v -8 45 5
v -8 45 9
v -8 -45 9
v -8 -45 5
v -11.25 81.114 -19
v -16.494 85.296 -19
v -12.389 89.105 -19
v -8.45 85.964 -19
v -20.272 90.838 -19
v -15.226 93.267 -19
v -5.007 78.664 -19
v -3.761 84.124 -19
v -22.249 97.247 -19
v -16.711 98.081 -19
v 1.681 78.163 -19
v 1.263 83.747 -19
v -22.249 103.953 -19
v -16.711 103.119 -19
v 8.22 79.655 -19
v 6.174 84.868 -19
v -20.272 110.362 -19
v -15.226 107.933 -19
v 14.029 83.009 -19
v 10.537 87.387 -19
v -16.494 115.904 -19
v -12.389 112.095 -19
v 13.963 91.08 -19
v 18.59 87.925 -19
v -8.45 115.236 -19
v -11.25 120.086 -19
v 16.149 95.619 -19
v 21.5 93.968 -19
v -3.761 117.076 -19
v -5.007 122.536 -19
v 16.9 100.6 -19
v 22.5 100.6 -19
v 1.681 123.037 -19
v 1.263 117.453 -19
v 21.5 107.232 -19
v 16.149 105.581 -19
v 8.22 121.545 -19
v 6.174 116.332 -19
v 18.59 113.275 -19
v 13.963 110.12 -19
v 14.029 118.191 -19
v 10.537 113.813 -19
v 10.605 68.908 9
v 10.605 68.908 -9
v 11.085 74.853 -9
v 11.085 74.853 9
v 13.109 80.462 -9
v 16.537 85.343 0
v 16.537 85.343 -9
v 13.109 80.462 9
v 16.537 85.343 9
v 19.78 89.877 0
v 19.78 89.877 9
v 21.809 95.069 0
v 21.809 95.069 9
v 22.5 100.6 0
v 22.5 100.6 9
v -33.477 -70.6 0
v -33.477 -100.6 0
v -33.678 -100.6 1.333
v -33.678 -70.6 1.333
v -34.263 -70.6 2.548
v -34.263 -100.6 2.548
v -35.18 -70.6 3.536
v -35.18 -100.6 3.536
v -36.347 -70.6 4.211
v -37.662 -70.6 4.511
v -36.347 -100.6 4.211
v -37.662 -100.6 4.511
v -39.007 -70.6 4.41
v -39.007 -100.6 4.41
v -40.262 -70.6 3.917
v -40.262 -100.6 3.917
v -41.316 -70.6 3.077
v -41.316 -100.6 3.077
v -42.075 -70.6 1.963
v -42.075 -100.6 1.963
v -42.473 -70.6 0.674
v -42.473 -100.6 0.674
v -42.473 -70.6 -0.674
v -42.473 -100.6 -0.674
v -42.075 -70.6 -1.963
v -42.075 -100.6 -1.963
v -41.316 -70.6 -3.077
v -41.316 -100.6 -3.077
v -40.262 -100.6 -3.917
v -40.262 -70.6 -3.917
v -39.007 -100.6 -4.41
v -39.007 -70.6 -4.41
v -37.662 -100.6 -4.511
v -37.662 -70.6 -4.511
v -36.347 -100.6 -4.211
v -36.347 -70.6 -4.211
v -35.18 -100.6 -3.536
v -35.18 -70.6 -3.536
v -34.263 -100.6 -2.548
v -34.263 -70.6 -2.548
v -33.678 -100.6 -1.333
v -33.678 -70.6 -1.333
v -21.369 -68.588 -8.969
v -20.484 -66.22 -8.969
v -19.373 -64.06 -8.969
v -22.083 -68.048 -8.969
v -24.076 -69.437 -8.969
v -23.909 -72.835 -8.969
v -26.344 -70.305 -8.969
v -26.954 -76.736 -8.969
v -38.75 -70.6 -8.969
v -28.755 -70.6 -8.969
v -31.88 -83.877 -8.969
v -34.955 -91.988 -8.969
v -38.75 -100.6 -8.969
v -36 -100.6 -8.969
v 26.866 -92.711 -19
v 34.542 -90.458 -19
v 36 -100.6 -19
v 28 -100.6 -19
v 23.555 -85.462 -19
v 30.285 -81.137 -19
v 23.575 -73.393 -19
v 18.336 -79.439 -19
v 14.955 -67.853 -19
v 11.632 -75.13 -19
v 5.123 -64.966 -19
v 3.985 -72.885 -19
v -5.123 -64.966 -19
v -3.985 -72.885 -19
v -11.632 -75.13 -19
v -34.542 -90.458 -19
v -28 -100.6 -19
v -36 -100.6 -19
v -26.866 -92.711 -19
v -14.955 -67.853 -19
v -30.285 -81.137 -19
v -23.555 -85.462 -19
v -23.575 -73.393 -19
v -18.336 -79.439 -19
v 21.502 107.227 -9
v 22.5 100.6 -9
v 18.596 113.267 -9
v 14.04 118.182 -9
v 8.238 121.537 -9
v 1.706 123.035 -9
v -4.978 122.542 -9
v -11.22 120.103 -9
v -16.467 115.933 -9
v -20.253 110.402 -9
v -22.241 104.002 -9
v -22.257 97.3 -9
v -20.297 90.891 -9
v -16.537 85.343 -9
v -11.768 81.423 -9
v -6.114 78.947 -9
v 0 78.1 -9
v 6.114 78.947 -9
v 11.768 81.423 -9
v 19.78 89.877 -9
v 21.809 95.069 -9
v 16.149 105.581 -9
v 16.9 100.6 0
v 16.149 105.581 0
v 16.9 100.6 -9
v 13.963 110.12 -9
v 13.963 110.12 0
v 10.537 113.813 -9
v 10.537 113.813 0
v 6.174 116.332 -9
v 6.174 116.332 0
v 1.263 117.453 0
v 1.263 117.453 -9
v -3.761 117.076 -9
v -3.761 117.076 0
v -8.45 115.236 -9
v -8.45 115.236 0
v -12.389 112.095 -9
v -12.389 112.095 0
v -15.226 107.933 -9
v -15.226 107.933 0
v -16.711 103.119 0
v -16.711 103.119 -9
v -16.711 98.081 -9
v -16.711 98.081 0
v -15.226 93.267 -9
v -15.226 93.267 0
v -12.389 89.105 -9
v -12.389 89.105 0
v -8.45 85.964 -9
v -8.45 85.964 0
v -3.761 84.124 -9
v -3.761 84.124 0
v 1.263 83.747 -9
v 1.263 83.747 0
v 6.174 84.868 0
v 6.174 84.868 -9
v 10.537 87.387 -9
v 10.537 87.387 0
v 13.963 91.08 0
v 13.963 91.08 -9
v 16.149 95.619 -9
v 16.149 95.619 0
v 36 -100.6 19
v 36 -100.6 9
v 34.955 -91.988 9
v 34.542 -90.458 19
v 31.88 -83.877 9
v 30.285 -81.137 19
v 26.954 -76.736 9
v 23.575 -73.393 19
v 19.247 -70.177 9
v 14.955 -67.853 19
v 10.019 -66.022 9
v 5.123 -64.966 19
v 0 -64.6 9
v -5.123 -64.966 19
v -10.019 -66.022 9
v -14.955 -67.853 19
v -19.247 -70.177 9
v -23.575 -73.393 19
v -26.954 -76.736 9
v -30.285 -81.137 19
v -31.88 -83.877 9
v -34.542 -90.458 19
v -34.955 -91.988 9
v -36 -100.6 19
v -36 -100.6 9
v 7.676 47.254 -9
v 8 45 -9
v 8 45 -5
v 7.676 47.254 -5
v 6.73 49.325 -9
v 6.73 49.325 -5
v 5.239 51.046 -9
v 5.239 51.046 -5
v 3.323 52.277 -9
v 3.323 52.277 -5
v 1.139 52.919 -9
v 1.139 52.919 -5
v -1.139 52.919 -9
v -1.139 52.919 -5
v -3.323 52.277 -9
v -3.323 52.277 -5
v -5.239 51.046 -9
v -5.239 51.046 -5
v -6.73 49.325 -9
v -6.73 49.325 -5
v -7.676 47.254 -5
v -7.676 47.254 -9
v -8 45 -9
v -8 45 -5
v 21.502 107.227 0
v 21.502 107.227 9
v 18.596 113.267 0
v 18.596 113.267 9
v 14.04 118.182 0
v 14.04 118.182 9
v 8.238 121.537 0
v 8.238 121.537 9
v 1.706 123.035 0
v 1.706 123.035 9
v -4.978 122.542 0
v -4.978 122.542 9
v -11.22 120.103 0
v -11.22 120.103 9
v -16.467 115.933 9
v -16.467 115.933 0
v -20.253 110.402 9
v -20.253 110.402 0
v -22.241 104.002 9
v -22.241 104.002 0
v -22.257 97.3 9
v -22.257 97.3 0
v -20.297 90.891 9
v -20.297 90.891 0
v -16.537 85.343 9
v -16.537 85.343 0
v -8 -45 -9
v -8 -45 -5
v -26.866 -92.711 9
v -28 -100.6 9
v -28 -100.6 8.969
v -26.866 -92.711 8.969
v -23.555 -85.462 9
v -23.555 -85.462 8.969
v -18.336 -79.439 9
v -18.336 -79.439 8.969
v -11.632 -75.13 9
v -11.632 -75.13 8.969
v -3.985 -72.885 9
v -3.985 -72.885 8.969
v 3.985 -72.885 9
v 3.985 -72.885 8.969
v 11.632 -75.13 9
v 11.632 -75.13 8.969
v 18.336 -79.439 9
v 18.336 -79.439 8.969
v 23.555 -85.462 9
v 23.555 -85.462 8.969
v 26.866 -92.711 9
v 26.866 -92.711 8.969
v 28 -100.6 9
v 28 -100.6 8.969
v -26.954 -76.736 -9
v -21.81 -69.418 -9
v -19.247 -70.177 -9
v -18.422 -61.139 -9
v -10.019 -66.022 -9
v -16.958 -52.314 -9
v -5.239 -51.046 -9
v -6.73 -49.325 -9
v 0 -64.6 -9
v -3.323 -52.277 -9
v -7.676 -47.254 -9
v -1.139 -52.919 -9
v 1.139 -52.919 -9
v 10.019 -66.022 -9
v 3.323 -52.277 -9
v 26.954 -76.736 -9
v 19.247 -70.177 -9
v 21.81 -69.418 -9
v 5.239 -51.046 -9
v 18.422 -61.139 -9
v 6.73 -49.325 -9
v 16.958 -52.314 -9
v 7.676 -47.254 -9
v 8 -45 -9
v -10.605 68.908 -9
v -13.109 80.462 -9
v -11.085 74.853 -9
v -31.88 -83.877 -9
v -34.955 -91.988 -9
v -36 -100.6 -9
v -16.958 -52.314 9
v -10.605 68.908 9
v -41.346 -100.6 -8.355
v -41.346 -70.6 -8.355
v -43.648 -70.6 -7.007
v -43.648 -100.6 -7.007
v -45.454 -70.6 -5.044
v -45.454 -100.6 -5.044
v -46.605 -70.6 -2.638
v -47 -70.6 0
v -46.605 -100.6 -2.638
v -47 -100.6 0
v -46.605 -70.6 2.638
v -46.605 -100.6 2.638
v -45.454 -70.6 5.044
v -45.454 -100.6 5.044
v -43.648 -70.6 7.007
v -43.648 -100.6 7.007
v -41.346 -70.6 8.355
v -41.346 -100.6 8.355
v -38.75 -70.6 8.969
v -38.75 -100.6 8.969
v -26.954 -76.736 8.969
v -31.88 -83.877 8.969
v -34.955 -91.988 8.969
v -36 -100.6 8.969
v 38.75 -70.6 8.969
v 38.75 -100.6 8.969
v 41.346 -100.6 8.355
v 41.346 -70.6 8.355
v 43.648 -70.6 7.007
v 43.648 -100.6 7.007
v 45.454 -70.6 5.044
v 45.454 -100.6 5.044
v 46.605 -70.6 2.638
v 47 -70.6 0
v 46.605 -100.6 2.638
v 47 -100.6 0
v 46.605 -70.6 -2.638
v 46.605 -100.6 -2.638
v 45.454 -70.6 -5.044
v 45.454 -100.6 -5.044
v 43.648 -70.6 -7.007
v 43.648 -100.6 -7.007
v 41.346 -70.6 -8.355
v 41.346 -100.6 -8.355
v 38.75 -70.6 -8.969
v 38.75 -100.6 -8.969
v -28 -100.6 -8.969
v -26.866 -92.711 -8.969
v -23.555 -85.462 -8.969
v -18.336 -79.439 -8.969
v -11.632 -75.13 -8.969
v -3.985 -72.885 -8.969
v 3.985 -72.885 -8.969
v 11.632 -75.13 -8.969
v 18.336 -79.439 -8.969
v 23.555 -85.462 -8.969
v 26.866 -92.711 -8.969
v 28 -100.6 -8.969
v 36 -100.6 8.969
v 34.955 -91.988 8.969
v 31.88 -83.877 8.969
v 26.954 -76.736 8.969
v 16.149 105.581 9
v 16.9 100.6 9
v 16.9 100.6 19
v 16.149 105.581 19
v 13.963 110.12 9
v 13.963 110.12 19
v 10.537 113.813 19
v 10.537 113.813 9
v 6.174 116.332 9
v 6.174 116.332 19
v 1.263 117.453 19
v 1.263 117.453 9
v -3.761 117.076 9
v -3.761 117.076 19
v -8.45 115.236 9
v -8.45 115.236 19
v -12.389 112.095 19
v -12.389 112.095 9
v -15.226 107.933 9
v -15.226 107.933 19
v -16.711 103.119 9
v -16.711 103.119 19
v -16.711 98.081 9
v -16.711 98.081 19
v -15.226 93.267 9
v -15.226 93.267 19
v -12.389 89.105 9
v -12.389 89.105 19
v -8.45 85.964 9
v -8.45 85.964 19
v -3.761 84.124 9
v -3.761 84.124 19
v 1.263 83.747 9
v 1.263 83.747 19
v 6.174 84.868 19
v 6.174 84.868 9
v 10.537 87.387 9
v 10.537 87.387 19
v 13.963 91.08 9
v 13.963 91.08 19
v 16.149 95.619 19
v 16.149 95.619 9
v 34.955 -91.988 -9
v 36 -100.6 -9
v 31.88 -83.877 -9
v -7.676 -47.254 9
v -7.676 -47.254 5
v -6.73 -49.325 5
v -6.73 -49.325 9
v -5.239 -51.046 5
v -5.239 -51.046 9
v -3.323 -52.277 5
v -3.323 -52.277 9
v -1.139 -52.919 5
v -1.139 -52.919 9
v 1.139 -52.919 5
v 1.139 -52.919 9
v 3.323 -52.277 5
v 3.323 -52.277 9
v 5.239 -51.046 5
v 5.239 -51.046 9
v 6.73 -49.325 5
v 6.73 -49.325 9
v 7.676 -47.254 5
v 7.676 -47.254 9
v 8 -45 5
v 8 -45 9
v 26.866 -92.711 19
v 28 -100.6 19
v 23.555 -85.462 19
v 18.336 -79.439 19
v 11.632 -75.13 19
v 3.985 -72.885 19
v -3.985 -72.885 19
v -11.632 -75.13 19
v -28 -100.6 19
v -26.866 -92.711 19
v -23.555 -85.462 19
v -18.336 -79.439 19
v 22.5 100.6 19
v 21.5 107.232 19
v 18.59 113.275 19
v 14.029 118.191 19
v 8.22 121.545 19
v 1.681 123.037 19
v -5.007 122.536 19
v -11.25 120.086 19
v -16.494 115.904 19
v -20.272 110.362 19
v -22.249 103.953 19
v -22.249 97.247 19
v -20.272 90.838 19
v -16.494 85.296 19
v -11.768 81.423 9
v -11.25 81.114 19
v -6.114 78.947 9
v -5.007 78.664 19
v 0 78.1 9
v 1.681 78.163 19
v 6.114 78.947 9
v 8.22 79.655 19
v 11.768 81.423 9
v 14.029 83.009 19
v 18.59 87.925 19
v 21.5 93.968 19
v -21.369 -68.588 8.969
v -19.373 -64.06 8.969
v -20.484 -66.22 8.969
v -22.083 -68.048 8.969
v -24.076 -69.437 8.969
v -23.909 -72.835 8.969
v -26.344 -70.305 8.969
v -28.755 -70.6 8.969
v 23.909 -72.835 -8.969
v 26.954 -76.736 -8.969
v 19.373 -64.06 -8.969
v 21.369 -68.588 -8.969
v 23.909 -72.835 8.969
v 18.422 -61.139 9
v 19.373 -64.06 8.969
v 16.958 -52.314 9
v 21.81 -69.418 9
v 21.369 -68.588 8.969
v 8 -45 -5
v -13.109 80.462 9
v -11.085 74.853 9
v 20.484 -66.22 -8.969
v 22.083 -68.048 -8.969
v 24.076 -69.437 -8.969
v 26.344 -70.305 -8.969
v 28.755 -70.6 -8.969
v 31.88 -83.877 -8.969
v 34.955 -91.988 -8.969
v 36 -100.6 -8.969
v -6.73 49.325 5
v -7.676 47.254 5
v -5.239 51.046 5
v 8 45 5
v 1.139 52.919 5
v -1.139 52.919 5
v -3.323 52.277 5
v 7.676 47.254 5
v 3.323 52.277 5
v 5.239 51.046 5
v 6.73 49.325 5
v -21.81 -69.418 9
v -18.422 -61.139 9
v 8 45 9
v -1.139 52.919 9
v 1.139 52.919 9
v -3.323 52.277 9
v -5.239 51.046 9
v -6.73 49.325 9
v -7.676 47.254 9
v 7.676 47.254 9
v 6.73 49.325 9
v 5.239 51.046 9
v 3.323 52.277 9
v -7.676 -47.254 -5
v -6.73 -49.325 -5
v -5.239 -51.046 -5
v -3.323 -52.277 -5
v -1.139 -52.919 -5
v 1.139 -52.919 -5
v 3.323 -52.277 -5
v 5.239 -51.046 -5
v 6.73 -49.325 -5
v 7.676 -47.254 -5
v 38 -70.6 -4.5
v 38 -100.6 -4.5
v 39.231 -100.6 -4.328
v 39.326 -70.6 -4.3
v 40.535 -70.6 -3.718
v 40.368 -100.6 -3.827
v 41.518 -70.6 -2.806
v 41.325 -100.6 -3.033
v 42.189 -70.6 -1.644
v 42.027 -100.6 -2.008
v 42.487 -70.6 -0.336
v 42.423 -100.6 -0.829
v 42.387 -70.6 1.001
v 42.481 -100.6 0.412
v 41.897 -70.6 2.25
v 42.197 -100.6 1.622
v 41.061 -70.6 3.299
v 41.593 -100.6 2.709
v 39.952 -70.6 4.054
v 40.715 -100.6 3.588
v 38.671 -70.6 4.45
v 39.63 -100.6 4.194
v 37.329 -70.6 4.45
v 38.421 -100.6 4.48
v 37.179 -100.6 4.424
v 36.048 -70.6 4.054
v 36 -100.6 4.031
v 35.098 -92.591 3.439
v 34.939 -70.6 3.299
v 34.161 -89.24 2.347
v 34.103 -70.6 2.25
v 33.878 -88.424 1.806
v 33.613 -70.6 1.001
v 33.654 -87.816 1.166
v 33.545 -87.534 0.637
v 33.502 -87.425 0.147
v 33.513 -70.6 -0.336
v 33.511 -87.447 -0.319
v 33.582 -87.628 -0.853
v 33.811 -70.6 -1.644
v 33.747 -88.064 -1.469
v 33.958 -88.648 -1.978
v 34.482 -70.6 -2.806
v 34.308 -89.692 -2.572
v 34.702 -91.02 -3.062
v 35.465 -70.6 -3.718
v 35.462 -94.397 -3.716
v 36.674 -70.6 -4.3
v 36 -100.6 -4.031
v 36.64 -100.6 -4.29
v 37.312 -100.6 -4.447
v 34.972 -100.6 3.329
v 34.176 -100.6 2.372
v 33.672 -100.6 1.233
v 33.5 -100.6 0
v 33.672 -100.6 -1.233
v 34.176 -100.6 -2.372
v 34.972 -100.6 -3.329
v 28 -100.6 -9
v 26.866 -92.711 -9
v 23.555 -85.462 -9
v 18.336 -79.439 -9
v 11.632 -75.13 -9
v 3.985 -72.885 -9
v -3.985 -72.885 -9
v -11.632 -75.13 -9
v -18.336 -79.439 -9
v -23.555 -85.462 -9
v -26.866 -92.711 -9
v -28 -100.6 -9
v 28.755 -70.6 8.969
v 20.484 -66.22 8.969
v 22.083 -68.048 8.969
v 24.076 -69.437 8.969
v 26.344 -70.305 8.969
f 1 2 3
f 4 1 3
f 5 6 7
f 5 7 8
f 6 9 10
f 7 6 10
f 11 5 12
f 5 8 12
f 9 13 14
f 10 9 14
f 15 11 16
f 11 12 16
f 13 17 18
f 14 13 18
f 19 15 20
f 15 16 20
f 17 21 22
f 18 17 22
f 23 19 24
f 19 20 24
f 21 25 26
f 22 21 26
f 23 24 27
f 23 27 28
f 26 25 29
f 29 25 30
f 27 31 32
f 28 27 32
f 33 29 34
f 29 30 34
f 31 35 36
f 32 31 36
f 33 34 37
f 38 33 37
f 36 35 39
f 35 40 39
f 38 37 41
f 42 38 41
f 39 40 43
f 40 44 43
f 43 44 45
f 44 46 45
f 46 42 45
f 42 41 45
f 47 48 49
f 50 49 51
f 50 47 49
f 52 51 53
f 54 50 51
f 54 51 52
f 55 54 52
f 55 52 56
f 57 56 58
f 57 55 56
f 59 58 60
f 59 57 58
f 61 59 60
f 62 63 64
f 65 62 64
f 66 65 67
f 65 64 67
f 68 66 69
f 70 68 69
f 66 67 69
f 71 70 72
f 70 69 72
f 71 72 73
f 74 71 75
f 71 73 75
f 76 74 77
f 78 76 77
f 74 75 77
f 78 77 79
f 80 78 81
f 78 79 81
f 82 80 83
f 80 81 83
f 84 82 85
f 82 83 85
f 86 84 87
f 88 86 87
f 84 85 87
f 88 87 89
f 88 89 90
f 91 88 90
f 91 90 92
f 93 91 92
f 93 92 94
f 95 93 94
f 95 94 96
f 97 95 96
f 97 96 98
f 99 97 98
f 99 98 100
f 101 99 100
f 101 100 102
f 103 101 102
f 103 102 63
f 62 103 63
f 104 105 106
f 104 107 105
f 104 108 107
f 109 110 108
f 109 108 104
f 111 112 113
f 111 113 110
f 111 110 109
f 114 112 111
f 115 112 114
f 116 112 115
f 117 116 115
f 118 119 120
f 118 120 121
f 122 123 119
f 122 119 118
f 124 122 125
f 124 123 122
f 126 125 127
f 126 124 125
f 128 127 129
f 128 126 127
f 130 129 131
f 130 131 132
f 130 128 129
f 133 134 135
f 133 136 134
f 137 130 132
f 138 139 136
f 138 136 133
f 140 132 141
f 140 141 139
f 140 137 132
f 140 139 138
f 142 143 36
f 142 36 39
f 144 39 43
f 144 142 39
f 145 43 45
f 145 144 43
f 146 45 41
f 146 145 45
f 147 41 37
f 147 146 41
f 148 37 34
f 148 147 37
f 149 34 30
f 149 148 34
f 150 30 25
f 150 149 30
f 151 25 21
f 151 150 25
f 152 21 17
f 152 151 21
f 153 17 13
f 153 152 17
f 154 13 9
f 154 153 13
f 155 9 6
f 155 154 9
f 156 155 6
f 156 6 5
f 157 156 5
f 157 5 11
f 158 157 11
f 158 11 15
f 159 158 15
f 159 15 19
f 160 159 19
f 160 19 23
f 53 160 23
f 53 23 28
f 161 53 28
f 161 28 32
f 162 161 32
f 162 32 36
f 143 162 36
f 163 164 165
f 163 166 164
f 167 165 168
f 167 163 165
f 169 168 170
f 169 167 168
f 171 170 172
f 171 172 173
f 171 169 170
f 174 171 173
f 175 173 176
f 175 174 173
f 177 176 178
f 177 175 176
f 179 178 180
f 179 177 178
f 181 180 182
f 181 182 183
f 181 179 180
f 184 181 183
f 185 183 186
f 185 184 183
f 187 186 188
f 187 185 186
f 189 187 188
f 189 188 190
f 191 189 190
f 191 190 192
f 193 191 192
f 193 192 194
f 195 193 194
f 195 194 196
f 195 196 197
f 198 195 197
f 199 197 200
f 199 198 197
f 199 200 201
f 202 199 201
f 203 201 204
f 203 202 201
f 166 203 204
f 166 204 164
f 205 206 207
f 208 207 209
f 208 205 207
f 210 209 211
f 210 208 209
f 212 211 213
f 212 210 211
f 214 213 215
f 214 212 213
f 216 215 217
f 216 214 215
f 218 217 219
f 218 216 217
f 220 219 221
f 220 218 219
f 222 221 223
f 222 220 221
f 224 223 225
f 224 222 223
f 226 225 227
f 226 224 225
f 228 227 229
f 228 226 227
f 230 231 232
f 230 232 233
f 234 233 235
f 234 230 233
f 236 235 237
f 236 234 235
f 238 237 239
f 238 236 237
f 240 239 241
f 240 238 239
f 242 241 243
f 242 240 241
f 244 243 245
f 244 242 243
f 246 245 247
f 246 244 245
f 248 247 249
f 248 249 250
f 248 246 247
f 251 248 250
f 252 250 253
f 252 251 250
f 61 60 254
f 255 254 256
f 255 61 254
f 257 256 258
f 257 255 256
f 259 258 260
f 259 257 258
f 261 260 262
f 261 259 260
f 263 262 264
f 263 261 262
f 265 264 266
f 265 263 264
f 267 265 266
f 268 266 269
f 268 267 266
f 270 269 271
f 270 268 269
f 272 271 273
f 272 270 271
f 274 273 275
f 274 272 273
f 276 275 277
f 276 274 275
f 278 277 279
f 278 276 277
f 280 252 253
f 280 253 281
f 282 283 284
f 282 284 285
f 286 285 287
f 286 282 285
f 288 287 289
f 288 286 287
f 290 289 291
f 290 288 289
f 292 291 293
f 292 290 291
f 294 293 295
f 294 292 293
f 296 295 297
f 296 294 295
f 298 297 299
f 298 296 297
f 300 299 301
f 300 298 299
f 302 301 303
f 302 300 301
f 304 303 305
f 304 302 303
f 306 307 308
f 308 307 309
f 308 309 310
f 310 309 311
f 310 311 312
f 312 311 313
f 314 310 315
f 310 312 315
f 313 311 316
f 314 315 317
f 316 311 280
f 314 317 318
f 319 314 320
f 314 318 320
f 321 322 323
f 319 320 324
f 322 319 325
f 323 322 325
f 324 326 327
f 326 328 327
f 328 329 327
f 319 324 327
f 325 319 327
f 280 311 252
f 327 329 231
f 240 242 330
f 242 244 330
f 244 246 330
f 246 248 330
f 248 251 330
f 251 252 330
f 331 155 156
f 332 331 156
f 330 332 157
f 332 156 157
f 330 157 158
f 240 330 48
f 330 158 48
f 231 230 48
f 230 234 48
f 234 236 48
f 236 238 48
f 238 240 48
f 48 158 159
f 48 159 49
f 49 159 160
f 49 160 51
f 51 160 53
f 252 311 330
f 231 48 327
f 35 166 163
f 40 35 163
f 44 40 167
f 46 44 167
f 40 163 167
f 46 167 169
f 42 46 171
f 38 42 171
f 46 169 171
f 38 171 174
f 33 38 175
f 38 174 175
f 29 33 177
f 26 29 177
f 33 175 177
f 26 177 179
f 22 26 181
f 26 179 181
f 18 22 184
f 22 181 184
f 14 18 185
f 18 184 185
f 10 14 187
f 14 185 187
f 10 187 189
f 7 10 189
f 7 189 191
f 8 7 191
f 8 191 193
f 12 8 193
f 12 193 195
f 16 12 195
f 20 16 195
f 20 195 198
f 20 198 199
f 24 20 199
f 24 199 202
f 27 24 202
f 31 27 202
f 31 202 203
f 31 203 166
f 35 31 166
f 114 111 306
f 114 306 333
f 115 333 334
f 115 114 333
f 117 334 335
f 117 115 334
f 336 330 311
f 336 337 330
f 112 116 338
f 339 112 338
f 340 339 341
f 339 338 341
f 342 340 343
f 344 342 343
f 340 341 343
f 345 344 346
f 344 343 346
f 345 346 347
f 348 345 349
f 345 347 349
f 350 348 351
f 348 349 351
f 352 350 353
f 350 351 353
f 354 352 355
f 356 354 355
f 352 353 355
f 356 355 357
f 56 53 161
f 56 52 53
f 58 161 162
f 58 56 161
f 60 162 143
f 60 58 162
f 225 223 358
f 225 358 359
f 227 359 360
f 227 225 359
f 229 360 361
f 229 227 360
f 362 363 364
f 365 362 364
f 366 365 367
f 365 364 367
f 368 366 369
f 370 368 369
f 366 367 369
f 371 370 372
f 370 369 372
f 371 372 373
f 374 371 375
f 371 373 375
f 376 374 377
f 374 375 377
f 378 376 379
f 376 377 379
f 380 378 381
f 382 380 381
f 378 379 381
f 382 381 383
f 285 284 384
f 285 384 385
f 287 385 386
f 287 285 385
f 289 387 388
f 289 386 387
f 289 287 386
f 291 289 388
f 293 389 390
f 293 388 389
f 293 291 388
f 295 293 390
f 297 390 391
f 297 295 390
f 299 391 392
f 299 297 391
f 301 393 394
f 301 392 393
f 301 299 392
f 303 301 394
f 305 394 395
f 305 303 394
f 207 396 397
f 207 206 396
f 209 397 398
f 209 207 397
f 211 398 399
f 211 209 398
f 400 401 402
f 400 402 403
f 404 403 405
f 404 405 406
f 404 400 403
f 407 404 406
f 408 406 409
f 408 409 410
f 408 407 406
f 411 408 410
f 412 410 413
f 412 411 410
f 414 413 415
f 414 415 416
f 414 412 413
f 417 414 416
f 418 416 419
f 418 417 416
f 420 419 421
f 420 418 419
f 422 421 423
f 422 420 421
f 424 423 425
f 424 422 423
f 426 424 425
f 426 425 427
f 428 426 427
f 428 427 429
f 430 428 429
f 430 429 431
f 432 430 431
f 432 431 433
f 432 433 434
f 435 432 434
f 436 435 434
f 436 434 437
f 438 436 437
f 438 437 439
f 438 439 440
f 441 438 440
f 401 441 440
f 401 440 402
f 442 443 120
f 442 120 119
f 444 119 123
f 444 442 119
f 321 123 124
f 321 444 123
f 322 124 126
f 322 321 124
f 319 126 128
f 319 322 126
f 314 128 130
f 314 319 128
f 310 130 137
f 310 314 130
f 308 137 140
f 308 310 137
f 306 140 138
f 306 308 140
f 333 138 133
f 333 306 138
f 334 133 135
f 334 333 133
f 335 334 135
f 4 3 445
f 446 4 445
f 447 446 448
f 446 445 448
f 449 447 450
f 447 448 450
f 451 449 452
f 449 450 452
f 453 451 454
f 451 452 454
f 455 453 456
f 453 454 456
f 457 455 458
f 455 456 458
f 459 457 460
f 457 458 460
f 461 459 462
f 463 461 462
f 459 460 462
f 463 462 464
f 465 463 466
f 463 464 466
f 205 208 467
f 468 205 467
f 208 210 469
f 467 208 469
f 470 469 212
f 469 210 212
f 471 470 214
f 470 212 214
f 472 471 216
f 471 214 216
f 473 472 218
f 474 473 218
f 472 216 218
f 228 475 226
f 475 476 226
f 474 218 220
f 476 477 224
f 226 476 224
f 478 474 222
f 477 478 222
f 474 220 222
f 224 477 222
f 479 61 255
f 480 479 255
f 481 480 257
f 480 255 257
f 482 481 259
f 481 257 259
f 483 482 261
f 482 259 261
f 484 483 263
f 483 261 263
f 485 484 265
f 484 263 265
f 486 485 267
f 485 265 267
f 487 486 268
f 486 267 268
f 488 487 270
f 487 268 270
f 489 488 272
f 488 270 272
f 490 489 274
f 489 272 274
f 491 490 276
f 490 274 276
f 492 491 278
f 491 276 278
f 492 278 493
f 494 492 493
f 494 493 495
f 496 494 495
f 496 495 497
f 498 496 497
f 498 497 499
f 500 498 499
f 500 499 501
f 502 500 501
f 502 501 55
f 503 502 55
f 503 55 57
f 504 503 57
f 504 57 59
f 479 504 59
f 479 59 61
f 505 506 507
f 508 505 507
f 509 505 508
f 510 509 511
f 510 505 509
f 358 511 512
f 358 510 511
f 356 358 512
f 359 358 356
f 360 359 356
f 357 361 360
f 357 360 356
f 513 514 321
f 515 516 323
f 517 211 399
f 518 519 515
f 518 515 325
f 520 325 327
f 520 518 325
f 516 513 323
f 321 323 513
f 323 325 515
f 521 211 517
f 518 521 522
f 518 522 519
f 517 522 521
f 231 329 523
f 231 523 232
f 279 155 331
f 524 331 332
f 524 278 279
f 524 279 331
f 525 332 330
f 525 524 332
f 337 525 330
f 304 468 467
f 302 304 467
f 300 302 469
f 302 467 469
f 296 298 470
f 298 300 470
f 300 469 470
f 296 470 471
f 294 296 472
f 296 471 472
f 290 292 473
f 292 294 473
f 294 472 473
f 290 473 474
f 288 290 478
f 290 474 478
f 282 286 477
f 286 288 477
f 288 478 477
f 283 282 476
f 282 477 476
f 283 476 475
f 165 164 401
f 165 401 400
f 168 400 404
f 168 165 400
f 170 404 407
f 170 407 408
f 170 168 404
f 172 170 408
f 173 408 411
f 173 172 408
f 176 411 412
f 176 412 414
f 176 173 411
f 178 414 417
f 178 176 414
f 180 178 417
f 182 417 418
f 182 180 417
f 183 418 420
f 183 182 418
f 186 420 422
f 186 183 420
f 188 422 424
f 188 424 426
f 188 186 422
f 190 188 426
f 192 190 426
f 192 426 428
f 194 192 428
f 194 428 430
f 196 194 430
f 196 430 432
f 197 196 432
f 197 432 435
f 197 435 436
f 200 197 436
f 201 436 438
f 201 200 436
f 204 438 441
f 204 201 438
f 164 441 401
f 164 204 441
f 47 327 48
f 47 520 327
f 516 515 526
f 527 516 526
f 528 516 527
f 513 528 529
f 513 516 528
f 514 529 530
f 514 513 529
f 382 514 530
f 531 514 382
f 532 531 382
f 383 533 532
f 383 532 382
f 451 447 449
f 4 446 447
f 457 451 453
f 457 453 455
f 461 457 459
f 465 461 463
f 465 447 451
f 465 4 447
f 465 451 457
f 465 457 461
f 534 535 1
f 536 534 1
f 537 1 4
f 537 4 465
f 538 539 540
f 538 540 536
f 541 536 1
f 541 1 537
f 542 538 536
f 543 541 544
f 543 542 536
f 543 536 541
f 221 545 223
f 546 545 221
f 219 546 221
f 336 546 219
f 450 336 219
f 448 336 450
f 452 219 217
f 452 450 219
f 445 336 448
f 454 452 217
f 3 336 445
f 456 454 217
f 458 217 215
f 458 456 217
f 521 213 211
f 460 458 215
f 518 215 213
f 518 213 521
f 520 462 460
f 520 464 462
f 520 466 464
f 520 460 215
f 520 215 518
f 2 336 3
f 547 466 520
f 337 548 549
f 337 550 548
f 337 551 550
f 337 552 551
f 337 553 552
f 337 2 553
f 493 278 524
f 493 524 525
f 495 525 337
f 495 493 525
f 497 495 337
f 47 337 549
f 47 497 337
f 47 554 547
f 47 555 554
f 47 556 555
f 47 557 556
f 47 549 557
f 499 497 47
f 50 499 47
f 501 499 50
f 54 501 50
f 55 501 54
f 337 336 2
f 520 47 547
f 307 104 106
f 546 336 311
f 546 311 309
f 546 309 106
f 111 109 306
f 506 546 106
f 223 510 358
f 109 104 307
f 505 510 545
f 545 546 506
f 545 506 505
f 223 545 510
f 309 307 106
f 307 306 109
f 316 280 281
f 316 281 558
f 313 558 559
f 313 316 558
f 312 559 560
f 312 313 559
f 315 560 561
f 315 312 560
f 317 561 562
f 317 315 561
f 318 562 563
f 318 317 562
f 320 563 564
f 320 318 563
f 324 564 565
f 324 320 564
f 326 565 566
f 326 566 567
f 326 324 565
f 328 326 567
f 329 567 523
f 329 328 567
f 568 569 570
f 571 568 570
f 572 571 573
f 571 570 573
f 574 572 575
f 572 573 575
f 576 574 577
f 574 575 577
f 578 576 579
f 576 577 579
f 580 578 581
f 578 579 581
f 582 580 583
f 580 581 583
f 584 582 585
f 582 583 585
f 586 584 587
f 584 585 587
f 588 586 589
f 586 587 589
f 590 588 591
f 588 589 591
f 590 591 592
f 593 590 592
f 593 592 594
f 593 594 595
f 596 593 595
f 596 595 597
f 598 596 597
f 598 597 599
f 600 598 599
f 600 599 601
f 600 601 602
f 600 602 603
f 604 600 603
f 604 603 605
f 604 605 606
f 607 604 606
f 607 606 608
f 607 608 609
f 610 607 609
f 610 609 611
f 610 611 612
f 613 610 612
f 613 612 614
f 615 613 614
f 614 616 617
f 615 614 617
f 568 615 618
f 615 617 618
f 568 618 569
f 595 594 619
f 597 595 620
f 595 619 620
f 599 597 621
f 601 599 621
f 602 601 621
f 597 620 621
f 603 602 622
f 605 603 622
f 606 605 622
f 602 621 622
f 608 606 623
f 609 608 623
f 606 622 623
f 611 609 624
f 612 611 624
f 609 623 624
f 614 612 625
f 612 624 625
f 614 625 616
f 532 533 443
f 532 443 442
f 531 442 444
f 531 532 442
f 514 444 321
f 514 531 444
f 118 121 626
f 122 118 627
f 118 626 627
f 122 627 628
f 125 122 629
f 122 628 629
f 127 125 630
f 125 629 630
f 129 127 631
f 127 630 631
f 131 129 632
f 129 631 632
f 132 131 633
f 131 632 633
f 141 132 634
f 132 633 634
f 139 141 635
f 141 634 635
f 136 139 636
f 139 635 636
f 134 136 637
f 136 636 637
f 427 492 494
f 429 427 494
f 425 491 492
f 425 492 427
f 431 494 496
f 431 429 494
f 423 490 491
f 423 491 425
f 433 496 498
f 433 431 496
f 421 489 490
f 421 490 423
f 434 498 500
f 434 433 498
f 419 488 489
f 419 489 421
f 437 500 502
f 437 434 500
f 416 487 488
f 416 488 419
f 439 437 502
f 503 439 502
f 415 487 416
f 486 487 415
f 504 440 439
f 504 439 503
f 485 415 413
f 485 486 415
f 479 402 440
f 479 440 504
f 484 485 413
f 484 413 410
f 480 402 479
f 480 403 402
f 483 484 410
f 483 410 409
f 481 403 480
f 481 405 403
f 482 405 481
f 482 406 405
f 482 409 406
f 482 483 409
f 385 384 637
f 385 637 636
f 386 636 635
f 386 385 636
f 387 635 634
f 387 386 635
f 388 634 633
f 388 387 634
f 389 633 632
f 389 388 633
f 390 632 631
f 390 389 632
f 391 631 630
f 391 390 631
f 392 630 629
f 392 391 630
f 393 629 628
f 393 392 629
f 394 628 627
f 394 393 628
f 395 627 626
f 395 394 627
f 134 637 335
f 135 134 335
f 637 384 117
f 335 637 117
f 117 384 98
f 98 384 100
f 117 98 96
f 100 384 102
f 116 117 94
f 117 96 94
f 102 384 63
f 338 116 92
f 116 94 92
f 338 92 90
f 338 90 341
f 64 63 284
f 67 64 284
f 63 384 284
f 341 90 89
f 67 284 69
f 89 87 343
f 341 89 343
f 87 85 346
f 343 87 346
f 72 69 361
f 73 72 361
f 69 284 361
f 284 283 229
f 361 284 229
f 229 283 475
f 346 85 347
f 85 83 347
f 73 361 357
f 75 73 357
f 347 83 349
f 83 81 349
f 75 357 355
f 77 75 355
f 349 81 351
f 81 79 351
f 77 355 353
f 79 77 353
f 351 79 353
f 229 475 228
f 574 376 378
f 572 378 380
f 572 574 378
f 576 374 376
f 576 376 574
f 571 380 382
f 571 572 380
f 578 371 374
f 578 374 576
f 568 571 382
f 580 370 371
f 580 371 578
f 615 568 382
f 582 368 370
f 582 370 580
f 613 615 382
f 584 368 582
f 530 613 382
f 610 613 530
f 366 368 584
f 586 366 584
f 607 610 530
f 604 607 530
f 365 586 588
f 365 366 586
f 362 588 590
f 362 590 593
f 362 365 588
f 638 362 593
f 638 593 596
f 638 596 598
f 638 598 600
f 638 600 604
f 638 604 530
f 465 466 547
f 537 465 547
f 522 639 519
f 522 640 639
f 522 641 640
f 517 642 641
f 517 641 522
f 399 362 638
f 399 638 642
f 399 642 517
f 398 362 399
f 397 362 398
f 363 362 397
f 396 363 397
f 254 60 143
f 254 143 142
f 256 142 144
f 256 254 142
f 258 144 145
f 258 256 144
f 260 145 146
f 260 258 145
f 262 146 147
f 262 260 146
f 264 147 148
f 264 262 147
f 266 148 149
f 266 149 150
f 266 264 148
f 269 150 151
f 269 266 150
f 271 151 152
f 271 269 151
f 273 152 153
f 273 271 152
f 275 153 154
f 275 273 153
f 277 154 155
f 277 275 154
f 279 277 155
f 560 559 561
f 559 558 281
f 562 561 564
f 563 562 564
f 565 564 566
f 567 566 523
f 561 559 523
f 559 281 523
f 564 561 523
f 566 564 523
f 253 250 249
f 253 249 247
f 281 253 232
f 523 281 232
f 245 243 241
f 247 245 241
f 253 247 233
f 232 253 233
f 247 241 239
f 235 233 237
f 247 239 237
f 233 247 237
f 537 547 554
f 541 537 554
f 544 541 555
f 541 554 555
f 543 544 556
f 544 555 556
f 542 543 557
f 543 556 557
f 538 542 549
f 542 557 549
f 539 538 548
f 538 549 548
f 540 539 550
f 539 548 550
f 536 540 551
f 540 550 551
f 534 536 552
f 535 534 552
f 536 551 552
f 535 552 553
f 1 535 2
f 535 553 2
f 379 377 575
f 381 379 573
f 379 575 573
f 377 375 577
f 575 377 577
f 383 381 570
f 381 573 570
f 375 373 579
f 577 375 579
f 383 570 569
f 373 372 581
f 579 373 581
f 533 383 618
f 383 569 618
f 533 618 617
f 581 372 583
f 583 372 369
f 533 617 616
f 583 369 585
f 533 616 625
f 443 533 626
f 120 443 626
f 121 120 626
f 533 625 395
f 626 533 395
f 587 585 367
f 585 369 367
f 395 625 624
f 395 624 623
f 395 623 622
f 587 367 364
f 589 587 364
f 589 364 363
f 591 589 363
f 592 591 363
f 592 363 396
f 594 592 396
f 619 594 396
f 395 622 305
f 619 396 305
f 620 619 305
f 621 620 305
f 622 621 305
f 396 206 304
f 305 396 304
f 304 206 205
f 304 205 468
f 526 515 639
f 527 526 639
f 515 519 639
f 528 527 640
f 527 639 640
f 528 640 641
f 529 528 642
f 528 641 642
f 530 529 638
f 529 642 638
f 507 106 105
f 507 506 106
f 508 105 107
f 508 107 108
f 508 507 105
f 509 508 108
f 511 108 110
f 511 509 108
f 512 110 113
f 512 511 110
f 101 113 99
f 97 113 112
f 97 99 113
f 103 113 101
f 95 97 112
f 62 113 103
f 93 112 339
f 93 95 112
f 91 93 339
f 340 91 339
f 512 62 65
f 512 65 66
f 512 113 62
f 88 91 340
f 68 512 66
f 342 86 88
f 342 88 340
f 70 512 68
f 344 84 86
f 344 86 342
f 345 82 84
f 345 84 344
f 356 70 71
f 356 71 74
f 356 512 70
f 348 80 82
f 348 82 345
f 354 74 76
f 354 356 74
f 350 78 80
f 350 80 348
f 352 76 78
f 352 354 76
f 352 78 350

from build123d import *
from build123d.topology import SkipClean

# Parameters (mm, degrees)
SKETCH1_R           = 16.9
BOSS_EXTRUDE1_DEPTH = 9
SKETCH3_R           = 22.5
SKETCH3_R_2         = 16.9
BOSS_EXTRUDE2_DEPTH = 19
SKETCH4_R           = 4.5
BOSS_EXTRUDE3_DEPTH = 30
CUT_EXTRUDE2_DEPTH  = 4
CUT_EXTRUDE3_DEPTH  = 138.13719408
FILLET1_R           = 10
FILLET2_R           = 10
SKETCH7_R           = 4.523289267
SKETCH7_R_2         = 4.5
CUT_EXTRUDE4_DEPTH  = 230.372382819


with BuildPart() as part:
    # Sketch1 → Boss-Extrude1 (new, symmetric)
    with BuildSketch(Plane.XY):
        with BuildLine():
            Line((-10.60459099, 68.908072309), (-16.957576671, -52.314115855))
            ThreePointArc((-16.957576671, -52.314115855), (-19.883826234, -65.373191797), (-26.953938029, -76.736110444))
            ThreePointArc((-26.953938029, -76.736110444), (-33.66260365, -87.839548775), (-36, -100.6))
            Line((-36, -100.6), (-28, -100.6))
            ThreePointArc((-28, -100.6), (0, -72.6), (28, -100.6))
            Line((28, -100.6), (36, -100.6))
            ThreePointArc((36, -100.6), (33.66260365, -87.839548775), (26.953938029, -76.736110444))
            ThreePointArc((26.953938029, -76.736110444), (19.883826234, -65.373191797), (16.957576671, -52.314115855))
            Line((16.957576671, -52.314115855), (10.60459099, 68.908072309))
            ThreePointArc((10.60459099, 68.908072309), (11.910272087, 77.724804636), (16.536877761, 85.342815662))
            ThreePointArc((16.536877761, 85.342815662), (0, 123.1), (-16.536877761, 85.342815662))
            ThreePointArc((-16.536877761, 85.342815662), (-11.910272087, 77.724804636), (-10.60459099, 68.908072309))
        make_face()
        with Locations((0, 100.6)):
            Circle(SKETCH1_R, mode=Mode.SUBTRACT)
    extrude(amount=BOSS_EXTRUDE1_DEPTH, both=True)

    # Sketch3 → Boss-Extrude2 (add, symmetric)
    # profile 1 of 2: a face of its own
    with SkipClean():  # the faces are left unmerged after this step: merging them gives an invalid solid
        with BuildSketch(Plane.XY):
            with Locations((0, 100.6)):
                Circle(SKETCH3_R)
            with Locations((0, 100.6)):
                Circle(SKETCH3_R_2, mode=Mode.SUBTRACT)
        # profile 2 of 2: a face of its own
        with BuildSketch(Plane.XY):
            with BuildLine():
                Line((-28, -100.6), (-36, -100.6))
                ThreePointArc((-36, -100.6), (0, -64.6), (36, -100.6))
                Line((36, -100.6), (28, -100.6))
                ThreePointArc((28, -100.6), (0, -72.6), (-28, -100.6))
            make_face()
        extrude(amount=BOSS_EXTRUDE2_DEPTH, both=True)

    # Sketch4 → Boss-Extrude3 (add)
    with SkipClean():  # the faces are left unmerged after this step: merging them gives an invalid solid
        with BuildSketch(Plane.XZ.offset(100.6)):
            with BuildLine():
                Line((28, 8.968695557), (-28, 8.968695557))
                Line((-28, 8.968695557), (-38.75, 8.968695557))
                ThreePointArc((-38.75, 8.968695557), (-47, 0), (-38.75, -8.968695557))
                Line((-38.75, -8.968695557), (-28, -8.968695557))
                Line((-28, -8.968695557), (28, -8.968695557))
                Line((28, -8.968695557), (38.75, -8.968695557))
                ThreePointArc((38.75, -8.968695557), (47, 0), (38.75, 8.968695557))
                Line((38.75, 8.968695557), (28, 8.968695557))
            make_face()
            with Locations((-38, 0)):
                Circle(SKETCH4_R, mode=Mode.SUBTRACT)
            with Locations((38, 0)):
                Circle(SKETCH4_R, mode=Mode.SUBTRACT)
        extrude(amount=-BOSS_EXTRUDE3_DEPTH)

    # Sketch5 → Cut-Extrude2 (cut)
    with SkipClean():  # the faces are left unmerged after this step: merging them gives an invalid solid
        with BuildSketch(Plane.XY.offset(9)):
            with BuildLine():
                Line((-8, 45), (-8, -45))
                ThreePointArc((-8, -45), (0, -53), (8, -45))
                Line((8, -45), (8, 45))
                ThreePointArc((8, 45), (0, 53), (-8, 45))
            make_face()
        cut_extrude2 = extrude(amount=-CUT_EXTRUDE2_DEPTH, mode=Mode.SUBTRACT)

    # Mirror1: Cut-Extrude2 across plane
    with SkipClean():  # the faces are left unmerged after this step: merging them gives an invalid solid
        add(cut_extrude2.mirror(Plane.XY), mode=Mode.SUBTRACT)

    # Sketch6 → Cut-Extrude3 (cut, through all)
    with SkipClean():  # the faces are left unmerged after this step: merging them gives an invalid solid
        with BuildSketch(Plane.XY.offset(19)):
            with BuildLine():
                Line((28, -100.6), (-28, -100.6))
                ThreePointArc((-28, -100.6), (0, -72.6), (28, -100.6))
            make_face()
        extrude(amount=-CUT_EXTRUDE3_DEPTH, mode=Mode.SUBTRACT)

    # Fillet1
    fillet1_edges = [part.edges().sort_by_distance(p)[0] for p in [
        (22.483530605, -70.6, 0),
    ]]
    fillet(fillet1_edges, radius=FILLET1_R)

    # Fillet2
    fillet2_edges = [part.edges().sort_by_distance(p)[0] for p in [
        (-22.483530605, -70.6, 0),
    ]]
    fillet(fillet2_edges, radius=FILLET2_R)

    # Sketch7 → Cut-Extrude4 (cut, through all)
    with SkipClean():  # the faces are left unmerged after this step: merging them gives an invalid solid
        with BuildSketch(Plane.XZ.offset(100.6)):
            with Locations((-38, 0)):
                Circle(SKETCH7_R)
            with Locations((38, 0)):
                Circle(SKETCH7_R_2)
        extrude(amount=-CUT_EXTRUDE4_DEPTH, mode=Mode.SUBTRACT)
    add(part.part.scale(1), mode=Mode.REPLACE)  # the faces are merged on a copy


solid = part.part
